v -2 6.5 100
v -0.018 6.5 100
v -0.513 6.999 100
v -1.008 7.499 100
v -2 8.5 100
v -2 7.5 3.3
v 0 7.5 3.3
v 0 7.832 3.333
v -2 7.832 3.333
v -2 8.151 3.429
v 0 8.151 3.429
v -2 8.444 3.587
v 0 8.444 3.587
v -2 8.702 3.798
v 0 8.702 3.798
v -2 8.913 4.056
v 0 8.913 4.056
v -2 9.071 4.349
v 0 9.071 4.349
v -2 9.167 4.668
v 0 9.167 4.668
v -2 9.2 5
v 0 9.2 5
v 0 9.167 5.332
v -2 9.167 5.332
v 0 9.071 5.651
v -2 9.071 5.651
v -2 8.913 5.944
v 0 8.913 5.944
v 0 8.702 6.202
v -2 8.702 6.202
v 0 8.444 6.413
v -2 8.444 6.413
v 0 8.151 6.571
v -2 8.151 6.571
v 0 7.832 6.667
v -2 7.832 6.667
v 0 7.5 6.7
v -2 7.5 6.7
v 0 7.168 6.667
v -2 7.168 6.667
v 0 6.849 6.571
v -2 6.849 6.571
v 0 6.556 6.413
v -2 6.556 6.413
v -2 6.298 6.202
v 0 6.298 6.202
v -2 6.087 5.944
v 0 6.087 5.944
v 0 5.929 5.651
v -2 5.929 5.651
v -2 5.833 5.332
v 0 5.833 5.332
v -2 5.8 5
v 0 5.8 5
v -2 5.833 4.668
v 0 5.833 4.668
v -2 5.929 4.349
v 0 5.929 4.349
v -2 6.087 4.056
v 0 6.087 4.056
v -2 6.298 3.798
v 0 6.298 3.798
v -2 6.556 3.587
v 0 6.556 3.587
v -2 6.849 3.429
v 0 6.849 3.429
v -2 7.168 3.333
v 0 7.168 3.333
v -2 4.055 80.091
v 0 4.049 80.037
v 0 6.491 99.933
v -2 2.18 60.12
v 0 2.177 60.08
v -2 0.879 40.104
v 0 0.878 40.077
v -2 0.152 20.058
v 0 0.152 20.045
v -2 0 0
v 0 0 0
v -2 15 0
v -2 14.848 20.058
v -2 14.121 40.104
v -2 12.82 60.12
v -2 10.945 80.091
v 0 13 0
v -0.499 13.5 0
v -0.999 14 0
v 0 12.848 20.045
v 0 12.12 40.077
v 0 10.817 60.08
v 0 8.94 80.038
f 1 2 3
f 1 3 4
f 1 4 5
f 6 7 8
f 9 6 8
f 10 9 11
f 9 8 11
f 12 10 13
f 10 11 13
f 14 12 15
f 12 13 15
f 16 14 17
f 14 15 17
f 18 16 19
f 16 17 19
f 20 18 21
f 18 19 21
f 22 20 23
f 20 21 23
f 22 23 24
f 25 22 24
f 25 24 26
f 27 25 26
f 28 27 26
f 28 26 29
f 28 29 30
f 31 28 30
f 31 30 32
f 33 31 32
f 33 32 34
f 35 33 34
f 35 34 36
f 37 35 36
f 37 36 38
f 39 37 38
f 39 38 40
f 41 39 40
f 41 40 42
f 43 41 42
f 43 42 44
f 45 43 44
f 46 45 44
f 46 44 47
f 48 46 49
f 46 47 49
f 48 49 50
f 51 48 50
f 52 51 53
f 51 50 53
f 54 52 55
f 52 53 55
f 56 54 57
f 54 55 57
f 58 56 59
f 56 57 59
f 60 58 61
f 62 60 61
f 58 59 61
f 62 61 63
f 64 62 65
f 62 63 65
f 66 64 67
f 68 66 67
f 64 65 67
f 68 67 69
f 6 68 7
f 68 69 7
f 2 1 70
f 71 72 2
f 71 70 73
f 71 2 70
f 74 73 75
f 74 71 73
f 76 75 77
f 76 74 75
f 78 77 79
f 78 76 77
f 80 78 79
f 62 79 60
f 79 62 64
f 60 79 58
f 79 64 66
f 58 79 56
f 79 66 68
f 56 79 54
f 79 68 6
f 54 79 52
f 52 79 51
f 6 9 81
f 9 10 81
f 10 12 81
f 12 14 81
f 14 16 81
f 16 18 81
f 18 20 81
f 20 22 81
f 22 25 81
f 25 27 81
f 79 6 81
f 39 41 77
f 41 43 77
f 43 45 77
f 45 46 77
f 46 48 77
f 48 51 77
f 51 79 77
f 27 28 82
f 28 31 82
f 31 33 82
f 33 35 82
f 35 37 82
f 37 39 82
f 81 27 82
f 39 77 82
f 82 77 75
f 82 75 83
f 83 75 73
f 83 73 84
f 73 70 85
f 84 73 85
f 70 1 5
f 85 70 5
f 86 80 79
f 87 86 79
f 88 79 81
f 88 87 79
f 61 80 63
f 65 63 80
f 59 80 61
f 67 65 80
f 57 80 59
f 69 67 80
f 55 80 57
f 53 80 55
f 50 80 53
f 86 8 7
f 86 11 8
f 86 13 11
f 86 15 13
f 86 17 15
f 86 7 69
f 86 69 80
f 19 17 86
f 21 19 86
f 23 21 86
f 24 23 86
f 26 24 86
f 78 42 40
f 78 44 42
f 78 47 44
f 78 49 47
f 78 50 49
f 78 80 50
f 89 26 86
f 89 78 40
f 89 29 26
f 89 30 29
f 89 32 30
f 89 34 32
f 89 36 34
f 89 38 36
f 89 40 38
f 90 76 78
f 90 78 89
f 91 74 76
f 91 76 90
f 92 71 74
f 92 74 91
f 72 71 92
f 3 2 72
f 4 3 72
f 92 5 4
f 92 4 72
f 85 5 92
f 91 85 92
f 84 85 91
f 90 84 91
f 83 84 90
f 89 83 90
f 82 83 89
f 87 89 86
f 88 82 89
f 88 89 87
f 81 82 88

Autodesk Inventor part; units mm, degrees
ref_plane "YZ Plane" through (0, 0, 0) normal (1, 0, 0) x (0, 1, 0)
ref_plane "XZ Plane" through (0, 0, 0) normal (0, 1, 0) x (-1, 0, 0)
ref_plane "XY Plane" through (0, 0, 0) normal (0, 0, 1) x (1, 0, 0)
sketch "スケッチ1" plane through (0, 0, 0) normal (1, 0, 0) x (0, 1, 0)
  line L0 (0, 0) -> (15, 0)
  line L1 (7.5, 0) -> (7.5, 100)
  arc A0 (6.5, 100) -> (0, 0) centre (699.9841, 4.7123) ccw
  arc A1 (15, 0) -> (8.5, 100) centre (-684.9841, 4.7123) ccw
  line L2 (6.5, 100) -> (8.5, 100)
  dimension "d0" = 15
  dimension "d1" = 100
  dimension "d3" = 700
  dimension "d4" = 700
extrude "押し出し1" add sketch "スケッチ1" against normal blind 2
chamfer "面取り1" distance 2 angle 45 1 edges at (0, 13.5418, 50.1165)
sketch "スケッチ2" plane through (0, 0, 0) normal (1, 0, 0) x (0, 0, -1)
  circle A0 centre (-5, 7.5) radius 1.7
  point P0 (0, 0)
  dimension "d10" = 3.4
extrude "押し出し2" cut sketch "スケッチ2" against normal blind 2
properties part number "scissor" material "ステンレス鋼"
